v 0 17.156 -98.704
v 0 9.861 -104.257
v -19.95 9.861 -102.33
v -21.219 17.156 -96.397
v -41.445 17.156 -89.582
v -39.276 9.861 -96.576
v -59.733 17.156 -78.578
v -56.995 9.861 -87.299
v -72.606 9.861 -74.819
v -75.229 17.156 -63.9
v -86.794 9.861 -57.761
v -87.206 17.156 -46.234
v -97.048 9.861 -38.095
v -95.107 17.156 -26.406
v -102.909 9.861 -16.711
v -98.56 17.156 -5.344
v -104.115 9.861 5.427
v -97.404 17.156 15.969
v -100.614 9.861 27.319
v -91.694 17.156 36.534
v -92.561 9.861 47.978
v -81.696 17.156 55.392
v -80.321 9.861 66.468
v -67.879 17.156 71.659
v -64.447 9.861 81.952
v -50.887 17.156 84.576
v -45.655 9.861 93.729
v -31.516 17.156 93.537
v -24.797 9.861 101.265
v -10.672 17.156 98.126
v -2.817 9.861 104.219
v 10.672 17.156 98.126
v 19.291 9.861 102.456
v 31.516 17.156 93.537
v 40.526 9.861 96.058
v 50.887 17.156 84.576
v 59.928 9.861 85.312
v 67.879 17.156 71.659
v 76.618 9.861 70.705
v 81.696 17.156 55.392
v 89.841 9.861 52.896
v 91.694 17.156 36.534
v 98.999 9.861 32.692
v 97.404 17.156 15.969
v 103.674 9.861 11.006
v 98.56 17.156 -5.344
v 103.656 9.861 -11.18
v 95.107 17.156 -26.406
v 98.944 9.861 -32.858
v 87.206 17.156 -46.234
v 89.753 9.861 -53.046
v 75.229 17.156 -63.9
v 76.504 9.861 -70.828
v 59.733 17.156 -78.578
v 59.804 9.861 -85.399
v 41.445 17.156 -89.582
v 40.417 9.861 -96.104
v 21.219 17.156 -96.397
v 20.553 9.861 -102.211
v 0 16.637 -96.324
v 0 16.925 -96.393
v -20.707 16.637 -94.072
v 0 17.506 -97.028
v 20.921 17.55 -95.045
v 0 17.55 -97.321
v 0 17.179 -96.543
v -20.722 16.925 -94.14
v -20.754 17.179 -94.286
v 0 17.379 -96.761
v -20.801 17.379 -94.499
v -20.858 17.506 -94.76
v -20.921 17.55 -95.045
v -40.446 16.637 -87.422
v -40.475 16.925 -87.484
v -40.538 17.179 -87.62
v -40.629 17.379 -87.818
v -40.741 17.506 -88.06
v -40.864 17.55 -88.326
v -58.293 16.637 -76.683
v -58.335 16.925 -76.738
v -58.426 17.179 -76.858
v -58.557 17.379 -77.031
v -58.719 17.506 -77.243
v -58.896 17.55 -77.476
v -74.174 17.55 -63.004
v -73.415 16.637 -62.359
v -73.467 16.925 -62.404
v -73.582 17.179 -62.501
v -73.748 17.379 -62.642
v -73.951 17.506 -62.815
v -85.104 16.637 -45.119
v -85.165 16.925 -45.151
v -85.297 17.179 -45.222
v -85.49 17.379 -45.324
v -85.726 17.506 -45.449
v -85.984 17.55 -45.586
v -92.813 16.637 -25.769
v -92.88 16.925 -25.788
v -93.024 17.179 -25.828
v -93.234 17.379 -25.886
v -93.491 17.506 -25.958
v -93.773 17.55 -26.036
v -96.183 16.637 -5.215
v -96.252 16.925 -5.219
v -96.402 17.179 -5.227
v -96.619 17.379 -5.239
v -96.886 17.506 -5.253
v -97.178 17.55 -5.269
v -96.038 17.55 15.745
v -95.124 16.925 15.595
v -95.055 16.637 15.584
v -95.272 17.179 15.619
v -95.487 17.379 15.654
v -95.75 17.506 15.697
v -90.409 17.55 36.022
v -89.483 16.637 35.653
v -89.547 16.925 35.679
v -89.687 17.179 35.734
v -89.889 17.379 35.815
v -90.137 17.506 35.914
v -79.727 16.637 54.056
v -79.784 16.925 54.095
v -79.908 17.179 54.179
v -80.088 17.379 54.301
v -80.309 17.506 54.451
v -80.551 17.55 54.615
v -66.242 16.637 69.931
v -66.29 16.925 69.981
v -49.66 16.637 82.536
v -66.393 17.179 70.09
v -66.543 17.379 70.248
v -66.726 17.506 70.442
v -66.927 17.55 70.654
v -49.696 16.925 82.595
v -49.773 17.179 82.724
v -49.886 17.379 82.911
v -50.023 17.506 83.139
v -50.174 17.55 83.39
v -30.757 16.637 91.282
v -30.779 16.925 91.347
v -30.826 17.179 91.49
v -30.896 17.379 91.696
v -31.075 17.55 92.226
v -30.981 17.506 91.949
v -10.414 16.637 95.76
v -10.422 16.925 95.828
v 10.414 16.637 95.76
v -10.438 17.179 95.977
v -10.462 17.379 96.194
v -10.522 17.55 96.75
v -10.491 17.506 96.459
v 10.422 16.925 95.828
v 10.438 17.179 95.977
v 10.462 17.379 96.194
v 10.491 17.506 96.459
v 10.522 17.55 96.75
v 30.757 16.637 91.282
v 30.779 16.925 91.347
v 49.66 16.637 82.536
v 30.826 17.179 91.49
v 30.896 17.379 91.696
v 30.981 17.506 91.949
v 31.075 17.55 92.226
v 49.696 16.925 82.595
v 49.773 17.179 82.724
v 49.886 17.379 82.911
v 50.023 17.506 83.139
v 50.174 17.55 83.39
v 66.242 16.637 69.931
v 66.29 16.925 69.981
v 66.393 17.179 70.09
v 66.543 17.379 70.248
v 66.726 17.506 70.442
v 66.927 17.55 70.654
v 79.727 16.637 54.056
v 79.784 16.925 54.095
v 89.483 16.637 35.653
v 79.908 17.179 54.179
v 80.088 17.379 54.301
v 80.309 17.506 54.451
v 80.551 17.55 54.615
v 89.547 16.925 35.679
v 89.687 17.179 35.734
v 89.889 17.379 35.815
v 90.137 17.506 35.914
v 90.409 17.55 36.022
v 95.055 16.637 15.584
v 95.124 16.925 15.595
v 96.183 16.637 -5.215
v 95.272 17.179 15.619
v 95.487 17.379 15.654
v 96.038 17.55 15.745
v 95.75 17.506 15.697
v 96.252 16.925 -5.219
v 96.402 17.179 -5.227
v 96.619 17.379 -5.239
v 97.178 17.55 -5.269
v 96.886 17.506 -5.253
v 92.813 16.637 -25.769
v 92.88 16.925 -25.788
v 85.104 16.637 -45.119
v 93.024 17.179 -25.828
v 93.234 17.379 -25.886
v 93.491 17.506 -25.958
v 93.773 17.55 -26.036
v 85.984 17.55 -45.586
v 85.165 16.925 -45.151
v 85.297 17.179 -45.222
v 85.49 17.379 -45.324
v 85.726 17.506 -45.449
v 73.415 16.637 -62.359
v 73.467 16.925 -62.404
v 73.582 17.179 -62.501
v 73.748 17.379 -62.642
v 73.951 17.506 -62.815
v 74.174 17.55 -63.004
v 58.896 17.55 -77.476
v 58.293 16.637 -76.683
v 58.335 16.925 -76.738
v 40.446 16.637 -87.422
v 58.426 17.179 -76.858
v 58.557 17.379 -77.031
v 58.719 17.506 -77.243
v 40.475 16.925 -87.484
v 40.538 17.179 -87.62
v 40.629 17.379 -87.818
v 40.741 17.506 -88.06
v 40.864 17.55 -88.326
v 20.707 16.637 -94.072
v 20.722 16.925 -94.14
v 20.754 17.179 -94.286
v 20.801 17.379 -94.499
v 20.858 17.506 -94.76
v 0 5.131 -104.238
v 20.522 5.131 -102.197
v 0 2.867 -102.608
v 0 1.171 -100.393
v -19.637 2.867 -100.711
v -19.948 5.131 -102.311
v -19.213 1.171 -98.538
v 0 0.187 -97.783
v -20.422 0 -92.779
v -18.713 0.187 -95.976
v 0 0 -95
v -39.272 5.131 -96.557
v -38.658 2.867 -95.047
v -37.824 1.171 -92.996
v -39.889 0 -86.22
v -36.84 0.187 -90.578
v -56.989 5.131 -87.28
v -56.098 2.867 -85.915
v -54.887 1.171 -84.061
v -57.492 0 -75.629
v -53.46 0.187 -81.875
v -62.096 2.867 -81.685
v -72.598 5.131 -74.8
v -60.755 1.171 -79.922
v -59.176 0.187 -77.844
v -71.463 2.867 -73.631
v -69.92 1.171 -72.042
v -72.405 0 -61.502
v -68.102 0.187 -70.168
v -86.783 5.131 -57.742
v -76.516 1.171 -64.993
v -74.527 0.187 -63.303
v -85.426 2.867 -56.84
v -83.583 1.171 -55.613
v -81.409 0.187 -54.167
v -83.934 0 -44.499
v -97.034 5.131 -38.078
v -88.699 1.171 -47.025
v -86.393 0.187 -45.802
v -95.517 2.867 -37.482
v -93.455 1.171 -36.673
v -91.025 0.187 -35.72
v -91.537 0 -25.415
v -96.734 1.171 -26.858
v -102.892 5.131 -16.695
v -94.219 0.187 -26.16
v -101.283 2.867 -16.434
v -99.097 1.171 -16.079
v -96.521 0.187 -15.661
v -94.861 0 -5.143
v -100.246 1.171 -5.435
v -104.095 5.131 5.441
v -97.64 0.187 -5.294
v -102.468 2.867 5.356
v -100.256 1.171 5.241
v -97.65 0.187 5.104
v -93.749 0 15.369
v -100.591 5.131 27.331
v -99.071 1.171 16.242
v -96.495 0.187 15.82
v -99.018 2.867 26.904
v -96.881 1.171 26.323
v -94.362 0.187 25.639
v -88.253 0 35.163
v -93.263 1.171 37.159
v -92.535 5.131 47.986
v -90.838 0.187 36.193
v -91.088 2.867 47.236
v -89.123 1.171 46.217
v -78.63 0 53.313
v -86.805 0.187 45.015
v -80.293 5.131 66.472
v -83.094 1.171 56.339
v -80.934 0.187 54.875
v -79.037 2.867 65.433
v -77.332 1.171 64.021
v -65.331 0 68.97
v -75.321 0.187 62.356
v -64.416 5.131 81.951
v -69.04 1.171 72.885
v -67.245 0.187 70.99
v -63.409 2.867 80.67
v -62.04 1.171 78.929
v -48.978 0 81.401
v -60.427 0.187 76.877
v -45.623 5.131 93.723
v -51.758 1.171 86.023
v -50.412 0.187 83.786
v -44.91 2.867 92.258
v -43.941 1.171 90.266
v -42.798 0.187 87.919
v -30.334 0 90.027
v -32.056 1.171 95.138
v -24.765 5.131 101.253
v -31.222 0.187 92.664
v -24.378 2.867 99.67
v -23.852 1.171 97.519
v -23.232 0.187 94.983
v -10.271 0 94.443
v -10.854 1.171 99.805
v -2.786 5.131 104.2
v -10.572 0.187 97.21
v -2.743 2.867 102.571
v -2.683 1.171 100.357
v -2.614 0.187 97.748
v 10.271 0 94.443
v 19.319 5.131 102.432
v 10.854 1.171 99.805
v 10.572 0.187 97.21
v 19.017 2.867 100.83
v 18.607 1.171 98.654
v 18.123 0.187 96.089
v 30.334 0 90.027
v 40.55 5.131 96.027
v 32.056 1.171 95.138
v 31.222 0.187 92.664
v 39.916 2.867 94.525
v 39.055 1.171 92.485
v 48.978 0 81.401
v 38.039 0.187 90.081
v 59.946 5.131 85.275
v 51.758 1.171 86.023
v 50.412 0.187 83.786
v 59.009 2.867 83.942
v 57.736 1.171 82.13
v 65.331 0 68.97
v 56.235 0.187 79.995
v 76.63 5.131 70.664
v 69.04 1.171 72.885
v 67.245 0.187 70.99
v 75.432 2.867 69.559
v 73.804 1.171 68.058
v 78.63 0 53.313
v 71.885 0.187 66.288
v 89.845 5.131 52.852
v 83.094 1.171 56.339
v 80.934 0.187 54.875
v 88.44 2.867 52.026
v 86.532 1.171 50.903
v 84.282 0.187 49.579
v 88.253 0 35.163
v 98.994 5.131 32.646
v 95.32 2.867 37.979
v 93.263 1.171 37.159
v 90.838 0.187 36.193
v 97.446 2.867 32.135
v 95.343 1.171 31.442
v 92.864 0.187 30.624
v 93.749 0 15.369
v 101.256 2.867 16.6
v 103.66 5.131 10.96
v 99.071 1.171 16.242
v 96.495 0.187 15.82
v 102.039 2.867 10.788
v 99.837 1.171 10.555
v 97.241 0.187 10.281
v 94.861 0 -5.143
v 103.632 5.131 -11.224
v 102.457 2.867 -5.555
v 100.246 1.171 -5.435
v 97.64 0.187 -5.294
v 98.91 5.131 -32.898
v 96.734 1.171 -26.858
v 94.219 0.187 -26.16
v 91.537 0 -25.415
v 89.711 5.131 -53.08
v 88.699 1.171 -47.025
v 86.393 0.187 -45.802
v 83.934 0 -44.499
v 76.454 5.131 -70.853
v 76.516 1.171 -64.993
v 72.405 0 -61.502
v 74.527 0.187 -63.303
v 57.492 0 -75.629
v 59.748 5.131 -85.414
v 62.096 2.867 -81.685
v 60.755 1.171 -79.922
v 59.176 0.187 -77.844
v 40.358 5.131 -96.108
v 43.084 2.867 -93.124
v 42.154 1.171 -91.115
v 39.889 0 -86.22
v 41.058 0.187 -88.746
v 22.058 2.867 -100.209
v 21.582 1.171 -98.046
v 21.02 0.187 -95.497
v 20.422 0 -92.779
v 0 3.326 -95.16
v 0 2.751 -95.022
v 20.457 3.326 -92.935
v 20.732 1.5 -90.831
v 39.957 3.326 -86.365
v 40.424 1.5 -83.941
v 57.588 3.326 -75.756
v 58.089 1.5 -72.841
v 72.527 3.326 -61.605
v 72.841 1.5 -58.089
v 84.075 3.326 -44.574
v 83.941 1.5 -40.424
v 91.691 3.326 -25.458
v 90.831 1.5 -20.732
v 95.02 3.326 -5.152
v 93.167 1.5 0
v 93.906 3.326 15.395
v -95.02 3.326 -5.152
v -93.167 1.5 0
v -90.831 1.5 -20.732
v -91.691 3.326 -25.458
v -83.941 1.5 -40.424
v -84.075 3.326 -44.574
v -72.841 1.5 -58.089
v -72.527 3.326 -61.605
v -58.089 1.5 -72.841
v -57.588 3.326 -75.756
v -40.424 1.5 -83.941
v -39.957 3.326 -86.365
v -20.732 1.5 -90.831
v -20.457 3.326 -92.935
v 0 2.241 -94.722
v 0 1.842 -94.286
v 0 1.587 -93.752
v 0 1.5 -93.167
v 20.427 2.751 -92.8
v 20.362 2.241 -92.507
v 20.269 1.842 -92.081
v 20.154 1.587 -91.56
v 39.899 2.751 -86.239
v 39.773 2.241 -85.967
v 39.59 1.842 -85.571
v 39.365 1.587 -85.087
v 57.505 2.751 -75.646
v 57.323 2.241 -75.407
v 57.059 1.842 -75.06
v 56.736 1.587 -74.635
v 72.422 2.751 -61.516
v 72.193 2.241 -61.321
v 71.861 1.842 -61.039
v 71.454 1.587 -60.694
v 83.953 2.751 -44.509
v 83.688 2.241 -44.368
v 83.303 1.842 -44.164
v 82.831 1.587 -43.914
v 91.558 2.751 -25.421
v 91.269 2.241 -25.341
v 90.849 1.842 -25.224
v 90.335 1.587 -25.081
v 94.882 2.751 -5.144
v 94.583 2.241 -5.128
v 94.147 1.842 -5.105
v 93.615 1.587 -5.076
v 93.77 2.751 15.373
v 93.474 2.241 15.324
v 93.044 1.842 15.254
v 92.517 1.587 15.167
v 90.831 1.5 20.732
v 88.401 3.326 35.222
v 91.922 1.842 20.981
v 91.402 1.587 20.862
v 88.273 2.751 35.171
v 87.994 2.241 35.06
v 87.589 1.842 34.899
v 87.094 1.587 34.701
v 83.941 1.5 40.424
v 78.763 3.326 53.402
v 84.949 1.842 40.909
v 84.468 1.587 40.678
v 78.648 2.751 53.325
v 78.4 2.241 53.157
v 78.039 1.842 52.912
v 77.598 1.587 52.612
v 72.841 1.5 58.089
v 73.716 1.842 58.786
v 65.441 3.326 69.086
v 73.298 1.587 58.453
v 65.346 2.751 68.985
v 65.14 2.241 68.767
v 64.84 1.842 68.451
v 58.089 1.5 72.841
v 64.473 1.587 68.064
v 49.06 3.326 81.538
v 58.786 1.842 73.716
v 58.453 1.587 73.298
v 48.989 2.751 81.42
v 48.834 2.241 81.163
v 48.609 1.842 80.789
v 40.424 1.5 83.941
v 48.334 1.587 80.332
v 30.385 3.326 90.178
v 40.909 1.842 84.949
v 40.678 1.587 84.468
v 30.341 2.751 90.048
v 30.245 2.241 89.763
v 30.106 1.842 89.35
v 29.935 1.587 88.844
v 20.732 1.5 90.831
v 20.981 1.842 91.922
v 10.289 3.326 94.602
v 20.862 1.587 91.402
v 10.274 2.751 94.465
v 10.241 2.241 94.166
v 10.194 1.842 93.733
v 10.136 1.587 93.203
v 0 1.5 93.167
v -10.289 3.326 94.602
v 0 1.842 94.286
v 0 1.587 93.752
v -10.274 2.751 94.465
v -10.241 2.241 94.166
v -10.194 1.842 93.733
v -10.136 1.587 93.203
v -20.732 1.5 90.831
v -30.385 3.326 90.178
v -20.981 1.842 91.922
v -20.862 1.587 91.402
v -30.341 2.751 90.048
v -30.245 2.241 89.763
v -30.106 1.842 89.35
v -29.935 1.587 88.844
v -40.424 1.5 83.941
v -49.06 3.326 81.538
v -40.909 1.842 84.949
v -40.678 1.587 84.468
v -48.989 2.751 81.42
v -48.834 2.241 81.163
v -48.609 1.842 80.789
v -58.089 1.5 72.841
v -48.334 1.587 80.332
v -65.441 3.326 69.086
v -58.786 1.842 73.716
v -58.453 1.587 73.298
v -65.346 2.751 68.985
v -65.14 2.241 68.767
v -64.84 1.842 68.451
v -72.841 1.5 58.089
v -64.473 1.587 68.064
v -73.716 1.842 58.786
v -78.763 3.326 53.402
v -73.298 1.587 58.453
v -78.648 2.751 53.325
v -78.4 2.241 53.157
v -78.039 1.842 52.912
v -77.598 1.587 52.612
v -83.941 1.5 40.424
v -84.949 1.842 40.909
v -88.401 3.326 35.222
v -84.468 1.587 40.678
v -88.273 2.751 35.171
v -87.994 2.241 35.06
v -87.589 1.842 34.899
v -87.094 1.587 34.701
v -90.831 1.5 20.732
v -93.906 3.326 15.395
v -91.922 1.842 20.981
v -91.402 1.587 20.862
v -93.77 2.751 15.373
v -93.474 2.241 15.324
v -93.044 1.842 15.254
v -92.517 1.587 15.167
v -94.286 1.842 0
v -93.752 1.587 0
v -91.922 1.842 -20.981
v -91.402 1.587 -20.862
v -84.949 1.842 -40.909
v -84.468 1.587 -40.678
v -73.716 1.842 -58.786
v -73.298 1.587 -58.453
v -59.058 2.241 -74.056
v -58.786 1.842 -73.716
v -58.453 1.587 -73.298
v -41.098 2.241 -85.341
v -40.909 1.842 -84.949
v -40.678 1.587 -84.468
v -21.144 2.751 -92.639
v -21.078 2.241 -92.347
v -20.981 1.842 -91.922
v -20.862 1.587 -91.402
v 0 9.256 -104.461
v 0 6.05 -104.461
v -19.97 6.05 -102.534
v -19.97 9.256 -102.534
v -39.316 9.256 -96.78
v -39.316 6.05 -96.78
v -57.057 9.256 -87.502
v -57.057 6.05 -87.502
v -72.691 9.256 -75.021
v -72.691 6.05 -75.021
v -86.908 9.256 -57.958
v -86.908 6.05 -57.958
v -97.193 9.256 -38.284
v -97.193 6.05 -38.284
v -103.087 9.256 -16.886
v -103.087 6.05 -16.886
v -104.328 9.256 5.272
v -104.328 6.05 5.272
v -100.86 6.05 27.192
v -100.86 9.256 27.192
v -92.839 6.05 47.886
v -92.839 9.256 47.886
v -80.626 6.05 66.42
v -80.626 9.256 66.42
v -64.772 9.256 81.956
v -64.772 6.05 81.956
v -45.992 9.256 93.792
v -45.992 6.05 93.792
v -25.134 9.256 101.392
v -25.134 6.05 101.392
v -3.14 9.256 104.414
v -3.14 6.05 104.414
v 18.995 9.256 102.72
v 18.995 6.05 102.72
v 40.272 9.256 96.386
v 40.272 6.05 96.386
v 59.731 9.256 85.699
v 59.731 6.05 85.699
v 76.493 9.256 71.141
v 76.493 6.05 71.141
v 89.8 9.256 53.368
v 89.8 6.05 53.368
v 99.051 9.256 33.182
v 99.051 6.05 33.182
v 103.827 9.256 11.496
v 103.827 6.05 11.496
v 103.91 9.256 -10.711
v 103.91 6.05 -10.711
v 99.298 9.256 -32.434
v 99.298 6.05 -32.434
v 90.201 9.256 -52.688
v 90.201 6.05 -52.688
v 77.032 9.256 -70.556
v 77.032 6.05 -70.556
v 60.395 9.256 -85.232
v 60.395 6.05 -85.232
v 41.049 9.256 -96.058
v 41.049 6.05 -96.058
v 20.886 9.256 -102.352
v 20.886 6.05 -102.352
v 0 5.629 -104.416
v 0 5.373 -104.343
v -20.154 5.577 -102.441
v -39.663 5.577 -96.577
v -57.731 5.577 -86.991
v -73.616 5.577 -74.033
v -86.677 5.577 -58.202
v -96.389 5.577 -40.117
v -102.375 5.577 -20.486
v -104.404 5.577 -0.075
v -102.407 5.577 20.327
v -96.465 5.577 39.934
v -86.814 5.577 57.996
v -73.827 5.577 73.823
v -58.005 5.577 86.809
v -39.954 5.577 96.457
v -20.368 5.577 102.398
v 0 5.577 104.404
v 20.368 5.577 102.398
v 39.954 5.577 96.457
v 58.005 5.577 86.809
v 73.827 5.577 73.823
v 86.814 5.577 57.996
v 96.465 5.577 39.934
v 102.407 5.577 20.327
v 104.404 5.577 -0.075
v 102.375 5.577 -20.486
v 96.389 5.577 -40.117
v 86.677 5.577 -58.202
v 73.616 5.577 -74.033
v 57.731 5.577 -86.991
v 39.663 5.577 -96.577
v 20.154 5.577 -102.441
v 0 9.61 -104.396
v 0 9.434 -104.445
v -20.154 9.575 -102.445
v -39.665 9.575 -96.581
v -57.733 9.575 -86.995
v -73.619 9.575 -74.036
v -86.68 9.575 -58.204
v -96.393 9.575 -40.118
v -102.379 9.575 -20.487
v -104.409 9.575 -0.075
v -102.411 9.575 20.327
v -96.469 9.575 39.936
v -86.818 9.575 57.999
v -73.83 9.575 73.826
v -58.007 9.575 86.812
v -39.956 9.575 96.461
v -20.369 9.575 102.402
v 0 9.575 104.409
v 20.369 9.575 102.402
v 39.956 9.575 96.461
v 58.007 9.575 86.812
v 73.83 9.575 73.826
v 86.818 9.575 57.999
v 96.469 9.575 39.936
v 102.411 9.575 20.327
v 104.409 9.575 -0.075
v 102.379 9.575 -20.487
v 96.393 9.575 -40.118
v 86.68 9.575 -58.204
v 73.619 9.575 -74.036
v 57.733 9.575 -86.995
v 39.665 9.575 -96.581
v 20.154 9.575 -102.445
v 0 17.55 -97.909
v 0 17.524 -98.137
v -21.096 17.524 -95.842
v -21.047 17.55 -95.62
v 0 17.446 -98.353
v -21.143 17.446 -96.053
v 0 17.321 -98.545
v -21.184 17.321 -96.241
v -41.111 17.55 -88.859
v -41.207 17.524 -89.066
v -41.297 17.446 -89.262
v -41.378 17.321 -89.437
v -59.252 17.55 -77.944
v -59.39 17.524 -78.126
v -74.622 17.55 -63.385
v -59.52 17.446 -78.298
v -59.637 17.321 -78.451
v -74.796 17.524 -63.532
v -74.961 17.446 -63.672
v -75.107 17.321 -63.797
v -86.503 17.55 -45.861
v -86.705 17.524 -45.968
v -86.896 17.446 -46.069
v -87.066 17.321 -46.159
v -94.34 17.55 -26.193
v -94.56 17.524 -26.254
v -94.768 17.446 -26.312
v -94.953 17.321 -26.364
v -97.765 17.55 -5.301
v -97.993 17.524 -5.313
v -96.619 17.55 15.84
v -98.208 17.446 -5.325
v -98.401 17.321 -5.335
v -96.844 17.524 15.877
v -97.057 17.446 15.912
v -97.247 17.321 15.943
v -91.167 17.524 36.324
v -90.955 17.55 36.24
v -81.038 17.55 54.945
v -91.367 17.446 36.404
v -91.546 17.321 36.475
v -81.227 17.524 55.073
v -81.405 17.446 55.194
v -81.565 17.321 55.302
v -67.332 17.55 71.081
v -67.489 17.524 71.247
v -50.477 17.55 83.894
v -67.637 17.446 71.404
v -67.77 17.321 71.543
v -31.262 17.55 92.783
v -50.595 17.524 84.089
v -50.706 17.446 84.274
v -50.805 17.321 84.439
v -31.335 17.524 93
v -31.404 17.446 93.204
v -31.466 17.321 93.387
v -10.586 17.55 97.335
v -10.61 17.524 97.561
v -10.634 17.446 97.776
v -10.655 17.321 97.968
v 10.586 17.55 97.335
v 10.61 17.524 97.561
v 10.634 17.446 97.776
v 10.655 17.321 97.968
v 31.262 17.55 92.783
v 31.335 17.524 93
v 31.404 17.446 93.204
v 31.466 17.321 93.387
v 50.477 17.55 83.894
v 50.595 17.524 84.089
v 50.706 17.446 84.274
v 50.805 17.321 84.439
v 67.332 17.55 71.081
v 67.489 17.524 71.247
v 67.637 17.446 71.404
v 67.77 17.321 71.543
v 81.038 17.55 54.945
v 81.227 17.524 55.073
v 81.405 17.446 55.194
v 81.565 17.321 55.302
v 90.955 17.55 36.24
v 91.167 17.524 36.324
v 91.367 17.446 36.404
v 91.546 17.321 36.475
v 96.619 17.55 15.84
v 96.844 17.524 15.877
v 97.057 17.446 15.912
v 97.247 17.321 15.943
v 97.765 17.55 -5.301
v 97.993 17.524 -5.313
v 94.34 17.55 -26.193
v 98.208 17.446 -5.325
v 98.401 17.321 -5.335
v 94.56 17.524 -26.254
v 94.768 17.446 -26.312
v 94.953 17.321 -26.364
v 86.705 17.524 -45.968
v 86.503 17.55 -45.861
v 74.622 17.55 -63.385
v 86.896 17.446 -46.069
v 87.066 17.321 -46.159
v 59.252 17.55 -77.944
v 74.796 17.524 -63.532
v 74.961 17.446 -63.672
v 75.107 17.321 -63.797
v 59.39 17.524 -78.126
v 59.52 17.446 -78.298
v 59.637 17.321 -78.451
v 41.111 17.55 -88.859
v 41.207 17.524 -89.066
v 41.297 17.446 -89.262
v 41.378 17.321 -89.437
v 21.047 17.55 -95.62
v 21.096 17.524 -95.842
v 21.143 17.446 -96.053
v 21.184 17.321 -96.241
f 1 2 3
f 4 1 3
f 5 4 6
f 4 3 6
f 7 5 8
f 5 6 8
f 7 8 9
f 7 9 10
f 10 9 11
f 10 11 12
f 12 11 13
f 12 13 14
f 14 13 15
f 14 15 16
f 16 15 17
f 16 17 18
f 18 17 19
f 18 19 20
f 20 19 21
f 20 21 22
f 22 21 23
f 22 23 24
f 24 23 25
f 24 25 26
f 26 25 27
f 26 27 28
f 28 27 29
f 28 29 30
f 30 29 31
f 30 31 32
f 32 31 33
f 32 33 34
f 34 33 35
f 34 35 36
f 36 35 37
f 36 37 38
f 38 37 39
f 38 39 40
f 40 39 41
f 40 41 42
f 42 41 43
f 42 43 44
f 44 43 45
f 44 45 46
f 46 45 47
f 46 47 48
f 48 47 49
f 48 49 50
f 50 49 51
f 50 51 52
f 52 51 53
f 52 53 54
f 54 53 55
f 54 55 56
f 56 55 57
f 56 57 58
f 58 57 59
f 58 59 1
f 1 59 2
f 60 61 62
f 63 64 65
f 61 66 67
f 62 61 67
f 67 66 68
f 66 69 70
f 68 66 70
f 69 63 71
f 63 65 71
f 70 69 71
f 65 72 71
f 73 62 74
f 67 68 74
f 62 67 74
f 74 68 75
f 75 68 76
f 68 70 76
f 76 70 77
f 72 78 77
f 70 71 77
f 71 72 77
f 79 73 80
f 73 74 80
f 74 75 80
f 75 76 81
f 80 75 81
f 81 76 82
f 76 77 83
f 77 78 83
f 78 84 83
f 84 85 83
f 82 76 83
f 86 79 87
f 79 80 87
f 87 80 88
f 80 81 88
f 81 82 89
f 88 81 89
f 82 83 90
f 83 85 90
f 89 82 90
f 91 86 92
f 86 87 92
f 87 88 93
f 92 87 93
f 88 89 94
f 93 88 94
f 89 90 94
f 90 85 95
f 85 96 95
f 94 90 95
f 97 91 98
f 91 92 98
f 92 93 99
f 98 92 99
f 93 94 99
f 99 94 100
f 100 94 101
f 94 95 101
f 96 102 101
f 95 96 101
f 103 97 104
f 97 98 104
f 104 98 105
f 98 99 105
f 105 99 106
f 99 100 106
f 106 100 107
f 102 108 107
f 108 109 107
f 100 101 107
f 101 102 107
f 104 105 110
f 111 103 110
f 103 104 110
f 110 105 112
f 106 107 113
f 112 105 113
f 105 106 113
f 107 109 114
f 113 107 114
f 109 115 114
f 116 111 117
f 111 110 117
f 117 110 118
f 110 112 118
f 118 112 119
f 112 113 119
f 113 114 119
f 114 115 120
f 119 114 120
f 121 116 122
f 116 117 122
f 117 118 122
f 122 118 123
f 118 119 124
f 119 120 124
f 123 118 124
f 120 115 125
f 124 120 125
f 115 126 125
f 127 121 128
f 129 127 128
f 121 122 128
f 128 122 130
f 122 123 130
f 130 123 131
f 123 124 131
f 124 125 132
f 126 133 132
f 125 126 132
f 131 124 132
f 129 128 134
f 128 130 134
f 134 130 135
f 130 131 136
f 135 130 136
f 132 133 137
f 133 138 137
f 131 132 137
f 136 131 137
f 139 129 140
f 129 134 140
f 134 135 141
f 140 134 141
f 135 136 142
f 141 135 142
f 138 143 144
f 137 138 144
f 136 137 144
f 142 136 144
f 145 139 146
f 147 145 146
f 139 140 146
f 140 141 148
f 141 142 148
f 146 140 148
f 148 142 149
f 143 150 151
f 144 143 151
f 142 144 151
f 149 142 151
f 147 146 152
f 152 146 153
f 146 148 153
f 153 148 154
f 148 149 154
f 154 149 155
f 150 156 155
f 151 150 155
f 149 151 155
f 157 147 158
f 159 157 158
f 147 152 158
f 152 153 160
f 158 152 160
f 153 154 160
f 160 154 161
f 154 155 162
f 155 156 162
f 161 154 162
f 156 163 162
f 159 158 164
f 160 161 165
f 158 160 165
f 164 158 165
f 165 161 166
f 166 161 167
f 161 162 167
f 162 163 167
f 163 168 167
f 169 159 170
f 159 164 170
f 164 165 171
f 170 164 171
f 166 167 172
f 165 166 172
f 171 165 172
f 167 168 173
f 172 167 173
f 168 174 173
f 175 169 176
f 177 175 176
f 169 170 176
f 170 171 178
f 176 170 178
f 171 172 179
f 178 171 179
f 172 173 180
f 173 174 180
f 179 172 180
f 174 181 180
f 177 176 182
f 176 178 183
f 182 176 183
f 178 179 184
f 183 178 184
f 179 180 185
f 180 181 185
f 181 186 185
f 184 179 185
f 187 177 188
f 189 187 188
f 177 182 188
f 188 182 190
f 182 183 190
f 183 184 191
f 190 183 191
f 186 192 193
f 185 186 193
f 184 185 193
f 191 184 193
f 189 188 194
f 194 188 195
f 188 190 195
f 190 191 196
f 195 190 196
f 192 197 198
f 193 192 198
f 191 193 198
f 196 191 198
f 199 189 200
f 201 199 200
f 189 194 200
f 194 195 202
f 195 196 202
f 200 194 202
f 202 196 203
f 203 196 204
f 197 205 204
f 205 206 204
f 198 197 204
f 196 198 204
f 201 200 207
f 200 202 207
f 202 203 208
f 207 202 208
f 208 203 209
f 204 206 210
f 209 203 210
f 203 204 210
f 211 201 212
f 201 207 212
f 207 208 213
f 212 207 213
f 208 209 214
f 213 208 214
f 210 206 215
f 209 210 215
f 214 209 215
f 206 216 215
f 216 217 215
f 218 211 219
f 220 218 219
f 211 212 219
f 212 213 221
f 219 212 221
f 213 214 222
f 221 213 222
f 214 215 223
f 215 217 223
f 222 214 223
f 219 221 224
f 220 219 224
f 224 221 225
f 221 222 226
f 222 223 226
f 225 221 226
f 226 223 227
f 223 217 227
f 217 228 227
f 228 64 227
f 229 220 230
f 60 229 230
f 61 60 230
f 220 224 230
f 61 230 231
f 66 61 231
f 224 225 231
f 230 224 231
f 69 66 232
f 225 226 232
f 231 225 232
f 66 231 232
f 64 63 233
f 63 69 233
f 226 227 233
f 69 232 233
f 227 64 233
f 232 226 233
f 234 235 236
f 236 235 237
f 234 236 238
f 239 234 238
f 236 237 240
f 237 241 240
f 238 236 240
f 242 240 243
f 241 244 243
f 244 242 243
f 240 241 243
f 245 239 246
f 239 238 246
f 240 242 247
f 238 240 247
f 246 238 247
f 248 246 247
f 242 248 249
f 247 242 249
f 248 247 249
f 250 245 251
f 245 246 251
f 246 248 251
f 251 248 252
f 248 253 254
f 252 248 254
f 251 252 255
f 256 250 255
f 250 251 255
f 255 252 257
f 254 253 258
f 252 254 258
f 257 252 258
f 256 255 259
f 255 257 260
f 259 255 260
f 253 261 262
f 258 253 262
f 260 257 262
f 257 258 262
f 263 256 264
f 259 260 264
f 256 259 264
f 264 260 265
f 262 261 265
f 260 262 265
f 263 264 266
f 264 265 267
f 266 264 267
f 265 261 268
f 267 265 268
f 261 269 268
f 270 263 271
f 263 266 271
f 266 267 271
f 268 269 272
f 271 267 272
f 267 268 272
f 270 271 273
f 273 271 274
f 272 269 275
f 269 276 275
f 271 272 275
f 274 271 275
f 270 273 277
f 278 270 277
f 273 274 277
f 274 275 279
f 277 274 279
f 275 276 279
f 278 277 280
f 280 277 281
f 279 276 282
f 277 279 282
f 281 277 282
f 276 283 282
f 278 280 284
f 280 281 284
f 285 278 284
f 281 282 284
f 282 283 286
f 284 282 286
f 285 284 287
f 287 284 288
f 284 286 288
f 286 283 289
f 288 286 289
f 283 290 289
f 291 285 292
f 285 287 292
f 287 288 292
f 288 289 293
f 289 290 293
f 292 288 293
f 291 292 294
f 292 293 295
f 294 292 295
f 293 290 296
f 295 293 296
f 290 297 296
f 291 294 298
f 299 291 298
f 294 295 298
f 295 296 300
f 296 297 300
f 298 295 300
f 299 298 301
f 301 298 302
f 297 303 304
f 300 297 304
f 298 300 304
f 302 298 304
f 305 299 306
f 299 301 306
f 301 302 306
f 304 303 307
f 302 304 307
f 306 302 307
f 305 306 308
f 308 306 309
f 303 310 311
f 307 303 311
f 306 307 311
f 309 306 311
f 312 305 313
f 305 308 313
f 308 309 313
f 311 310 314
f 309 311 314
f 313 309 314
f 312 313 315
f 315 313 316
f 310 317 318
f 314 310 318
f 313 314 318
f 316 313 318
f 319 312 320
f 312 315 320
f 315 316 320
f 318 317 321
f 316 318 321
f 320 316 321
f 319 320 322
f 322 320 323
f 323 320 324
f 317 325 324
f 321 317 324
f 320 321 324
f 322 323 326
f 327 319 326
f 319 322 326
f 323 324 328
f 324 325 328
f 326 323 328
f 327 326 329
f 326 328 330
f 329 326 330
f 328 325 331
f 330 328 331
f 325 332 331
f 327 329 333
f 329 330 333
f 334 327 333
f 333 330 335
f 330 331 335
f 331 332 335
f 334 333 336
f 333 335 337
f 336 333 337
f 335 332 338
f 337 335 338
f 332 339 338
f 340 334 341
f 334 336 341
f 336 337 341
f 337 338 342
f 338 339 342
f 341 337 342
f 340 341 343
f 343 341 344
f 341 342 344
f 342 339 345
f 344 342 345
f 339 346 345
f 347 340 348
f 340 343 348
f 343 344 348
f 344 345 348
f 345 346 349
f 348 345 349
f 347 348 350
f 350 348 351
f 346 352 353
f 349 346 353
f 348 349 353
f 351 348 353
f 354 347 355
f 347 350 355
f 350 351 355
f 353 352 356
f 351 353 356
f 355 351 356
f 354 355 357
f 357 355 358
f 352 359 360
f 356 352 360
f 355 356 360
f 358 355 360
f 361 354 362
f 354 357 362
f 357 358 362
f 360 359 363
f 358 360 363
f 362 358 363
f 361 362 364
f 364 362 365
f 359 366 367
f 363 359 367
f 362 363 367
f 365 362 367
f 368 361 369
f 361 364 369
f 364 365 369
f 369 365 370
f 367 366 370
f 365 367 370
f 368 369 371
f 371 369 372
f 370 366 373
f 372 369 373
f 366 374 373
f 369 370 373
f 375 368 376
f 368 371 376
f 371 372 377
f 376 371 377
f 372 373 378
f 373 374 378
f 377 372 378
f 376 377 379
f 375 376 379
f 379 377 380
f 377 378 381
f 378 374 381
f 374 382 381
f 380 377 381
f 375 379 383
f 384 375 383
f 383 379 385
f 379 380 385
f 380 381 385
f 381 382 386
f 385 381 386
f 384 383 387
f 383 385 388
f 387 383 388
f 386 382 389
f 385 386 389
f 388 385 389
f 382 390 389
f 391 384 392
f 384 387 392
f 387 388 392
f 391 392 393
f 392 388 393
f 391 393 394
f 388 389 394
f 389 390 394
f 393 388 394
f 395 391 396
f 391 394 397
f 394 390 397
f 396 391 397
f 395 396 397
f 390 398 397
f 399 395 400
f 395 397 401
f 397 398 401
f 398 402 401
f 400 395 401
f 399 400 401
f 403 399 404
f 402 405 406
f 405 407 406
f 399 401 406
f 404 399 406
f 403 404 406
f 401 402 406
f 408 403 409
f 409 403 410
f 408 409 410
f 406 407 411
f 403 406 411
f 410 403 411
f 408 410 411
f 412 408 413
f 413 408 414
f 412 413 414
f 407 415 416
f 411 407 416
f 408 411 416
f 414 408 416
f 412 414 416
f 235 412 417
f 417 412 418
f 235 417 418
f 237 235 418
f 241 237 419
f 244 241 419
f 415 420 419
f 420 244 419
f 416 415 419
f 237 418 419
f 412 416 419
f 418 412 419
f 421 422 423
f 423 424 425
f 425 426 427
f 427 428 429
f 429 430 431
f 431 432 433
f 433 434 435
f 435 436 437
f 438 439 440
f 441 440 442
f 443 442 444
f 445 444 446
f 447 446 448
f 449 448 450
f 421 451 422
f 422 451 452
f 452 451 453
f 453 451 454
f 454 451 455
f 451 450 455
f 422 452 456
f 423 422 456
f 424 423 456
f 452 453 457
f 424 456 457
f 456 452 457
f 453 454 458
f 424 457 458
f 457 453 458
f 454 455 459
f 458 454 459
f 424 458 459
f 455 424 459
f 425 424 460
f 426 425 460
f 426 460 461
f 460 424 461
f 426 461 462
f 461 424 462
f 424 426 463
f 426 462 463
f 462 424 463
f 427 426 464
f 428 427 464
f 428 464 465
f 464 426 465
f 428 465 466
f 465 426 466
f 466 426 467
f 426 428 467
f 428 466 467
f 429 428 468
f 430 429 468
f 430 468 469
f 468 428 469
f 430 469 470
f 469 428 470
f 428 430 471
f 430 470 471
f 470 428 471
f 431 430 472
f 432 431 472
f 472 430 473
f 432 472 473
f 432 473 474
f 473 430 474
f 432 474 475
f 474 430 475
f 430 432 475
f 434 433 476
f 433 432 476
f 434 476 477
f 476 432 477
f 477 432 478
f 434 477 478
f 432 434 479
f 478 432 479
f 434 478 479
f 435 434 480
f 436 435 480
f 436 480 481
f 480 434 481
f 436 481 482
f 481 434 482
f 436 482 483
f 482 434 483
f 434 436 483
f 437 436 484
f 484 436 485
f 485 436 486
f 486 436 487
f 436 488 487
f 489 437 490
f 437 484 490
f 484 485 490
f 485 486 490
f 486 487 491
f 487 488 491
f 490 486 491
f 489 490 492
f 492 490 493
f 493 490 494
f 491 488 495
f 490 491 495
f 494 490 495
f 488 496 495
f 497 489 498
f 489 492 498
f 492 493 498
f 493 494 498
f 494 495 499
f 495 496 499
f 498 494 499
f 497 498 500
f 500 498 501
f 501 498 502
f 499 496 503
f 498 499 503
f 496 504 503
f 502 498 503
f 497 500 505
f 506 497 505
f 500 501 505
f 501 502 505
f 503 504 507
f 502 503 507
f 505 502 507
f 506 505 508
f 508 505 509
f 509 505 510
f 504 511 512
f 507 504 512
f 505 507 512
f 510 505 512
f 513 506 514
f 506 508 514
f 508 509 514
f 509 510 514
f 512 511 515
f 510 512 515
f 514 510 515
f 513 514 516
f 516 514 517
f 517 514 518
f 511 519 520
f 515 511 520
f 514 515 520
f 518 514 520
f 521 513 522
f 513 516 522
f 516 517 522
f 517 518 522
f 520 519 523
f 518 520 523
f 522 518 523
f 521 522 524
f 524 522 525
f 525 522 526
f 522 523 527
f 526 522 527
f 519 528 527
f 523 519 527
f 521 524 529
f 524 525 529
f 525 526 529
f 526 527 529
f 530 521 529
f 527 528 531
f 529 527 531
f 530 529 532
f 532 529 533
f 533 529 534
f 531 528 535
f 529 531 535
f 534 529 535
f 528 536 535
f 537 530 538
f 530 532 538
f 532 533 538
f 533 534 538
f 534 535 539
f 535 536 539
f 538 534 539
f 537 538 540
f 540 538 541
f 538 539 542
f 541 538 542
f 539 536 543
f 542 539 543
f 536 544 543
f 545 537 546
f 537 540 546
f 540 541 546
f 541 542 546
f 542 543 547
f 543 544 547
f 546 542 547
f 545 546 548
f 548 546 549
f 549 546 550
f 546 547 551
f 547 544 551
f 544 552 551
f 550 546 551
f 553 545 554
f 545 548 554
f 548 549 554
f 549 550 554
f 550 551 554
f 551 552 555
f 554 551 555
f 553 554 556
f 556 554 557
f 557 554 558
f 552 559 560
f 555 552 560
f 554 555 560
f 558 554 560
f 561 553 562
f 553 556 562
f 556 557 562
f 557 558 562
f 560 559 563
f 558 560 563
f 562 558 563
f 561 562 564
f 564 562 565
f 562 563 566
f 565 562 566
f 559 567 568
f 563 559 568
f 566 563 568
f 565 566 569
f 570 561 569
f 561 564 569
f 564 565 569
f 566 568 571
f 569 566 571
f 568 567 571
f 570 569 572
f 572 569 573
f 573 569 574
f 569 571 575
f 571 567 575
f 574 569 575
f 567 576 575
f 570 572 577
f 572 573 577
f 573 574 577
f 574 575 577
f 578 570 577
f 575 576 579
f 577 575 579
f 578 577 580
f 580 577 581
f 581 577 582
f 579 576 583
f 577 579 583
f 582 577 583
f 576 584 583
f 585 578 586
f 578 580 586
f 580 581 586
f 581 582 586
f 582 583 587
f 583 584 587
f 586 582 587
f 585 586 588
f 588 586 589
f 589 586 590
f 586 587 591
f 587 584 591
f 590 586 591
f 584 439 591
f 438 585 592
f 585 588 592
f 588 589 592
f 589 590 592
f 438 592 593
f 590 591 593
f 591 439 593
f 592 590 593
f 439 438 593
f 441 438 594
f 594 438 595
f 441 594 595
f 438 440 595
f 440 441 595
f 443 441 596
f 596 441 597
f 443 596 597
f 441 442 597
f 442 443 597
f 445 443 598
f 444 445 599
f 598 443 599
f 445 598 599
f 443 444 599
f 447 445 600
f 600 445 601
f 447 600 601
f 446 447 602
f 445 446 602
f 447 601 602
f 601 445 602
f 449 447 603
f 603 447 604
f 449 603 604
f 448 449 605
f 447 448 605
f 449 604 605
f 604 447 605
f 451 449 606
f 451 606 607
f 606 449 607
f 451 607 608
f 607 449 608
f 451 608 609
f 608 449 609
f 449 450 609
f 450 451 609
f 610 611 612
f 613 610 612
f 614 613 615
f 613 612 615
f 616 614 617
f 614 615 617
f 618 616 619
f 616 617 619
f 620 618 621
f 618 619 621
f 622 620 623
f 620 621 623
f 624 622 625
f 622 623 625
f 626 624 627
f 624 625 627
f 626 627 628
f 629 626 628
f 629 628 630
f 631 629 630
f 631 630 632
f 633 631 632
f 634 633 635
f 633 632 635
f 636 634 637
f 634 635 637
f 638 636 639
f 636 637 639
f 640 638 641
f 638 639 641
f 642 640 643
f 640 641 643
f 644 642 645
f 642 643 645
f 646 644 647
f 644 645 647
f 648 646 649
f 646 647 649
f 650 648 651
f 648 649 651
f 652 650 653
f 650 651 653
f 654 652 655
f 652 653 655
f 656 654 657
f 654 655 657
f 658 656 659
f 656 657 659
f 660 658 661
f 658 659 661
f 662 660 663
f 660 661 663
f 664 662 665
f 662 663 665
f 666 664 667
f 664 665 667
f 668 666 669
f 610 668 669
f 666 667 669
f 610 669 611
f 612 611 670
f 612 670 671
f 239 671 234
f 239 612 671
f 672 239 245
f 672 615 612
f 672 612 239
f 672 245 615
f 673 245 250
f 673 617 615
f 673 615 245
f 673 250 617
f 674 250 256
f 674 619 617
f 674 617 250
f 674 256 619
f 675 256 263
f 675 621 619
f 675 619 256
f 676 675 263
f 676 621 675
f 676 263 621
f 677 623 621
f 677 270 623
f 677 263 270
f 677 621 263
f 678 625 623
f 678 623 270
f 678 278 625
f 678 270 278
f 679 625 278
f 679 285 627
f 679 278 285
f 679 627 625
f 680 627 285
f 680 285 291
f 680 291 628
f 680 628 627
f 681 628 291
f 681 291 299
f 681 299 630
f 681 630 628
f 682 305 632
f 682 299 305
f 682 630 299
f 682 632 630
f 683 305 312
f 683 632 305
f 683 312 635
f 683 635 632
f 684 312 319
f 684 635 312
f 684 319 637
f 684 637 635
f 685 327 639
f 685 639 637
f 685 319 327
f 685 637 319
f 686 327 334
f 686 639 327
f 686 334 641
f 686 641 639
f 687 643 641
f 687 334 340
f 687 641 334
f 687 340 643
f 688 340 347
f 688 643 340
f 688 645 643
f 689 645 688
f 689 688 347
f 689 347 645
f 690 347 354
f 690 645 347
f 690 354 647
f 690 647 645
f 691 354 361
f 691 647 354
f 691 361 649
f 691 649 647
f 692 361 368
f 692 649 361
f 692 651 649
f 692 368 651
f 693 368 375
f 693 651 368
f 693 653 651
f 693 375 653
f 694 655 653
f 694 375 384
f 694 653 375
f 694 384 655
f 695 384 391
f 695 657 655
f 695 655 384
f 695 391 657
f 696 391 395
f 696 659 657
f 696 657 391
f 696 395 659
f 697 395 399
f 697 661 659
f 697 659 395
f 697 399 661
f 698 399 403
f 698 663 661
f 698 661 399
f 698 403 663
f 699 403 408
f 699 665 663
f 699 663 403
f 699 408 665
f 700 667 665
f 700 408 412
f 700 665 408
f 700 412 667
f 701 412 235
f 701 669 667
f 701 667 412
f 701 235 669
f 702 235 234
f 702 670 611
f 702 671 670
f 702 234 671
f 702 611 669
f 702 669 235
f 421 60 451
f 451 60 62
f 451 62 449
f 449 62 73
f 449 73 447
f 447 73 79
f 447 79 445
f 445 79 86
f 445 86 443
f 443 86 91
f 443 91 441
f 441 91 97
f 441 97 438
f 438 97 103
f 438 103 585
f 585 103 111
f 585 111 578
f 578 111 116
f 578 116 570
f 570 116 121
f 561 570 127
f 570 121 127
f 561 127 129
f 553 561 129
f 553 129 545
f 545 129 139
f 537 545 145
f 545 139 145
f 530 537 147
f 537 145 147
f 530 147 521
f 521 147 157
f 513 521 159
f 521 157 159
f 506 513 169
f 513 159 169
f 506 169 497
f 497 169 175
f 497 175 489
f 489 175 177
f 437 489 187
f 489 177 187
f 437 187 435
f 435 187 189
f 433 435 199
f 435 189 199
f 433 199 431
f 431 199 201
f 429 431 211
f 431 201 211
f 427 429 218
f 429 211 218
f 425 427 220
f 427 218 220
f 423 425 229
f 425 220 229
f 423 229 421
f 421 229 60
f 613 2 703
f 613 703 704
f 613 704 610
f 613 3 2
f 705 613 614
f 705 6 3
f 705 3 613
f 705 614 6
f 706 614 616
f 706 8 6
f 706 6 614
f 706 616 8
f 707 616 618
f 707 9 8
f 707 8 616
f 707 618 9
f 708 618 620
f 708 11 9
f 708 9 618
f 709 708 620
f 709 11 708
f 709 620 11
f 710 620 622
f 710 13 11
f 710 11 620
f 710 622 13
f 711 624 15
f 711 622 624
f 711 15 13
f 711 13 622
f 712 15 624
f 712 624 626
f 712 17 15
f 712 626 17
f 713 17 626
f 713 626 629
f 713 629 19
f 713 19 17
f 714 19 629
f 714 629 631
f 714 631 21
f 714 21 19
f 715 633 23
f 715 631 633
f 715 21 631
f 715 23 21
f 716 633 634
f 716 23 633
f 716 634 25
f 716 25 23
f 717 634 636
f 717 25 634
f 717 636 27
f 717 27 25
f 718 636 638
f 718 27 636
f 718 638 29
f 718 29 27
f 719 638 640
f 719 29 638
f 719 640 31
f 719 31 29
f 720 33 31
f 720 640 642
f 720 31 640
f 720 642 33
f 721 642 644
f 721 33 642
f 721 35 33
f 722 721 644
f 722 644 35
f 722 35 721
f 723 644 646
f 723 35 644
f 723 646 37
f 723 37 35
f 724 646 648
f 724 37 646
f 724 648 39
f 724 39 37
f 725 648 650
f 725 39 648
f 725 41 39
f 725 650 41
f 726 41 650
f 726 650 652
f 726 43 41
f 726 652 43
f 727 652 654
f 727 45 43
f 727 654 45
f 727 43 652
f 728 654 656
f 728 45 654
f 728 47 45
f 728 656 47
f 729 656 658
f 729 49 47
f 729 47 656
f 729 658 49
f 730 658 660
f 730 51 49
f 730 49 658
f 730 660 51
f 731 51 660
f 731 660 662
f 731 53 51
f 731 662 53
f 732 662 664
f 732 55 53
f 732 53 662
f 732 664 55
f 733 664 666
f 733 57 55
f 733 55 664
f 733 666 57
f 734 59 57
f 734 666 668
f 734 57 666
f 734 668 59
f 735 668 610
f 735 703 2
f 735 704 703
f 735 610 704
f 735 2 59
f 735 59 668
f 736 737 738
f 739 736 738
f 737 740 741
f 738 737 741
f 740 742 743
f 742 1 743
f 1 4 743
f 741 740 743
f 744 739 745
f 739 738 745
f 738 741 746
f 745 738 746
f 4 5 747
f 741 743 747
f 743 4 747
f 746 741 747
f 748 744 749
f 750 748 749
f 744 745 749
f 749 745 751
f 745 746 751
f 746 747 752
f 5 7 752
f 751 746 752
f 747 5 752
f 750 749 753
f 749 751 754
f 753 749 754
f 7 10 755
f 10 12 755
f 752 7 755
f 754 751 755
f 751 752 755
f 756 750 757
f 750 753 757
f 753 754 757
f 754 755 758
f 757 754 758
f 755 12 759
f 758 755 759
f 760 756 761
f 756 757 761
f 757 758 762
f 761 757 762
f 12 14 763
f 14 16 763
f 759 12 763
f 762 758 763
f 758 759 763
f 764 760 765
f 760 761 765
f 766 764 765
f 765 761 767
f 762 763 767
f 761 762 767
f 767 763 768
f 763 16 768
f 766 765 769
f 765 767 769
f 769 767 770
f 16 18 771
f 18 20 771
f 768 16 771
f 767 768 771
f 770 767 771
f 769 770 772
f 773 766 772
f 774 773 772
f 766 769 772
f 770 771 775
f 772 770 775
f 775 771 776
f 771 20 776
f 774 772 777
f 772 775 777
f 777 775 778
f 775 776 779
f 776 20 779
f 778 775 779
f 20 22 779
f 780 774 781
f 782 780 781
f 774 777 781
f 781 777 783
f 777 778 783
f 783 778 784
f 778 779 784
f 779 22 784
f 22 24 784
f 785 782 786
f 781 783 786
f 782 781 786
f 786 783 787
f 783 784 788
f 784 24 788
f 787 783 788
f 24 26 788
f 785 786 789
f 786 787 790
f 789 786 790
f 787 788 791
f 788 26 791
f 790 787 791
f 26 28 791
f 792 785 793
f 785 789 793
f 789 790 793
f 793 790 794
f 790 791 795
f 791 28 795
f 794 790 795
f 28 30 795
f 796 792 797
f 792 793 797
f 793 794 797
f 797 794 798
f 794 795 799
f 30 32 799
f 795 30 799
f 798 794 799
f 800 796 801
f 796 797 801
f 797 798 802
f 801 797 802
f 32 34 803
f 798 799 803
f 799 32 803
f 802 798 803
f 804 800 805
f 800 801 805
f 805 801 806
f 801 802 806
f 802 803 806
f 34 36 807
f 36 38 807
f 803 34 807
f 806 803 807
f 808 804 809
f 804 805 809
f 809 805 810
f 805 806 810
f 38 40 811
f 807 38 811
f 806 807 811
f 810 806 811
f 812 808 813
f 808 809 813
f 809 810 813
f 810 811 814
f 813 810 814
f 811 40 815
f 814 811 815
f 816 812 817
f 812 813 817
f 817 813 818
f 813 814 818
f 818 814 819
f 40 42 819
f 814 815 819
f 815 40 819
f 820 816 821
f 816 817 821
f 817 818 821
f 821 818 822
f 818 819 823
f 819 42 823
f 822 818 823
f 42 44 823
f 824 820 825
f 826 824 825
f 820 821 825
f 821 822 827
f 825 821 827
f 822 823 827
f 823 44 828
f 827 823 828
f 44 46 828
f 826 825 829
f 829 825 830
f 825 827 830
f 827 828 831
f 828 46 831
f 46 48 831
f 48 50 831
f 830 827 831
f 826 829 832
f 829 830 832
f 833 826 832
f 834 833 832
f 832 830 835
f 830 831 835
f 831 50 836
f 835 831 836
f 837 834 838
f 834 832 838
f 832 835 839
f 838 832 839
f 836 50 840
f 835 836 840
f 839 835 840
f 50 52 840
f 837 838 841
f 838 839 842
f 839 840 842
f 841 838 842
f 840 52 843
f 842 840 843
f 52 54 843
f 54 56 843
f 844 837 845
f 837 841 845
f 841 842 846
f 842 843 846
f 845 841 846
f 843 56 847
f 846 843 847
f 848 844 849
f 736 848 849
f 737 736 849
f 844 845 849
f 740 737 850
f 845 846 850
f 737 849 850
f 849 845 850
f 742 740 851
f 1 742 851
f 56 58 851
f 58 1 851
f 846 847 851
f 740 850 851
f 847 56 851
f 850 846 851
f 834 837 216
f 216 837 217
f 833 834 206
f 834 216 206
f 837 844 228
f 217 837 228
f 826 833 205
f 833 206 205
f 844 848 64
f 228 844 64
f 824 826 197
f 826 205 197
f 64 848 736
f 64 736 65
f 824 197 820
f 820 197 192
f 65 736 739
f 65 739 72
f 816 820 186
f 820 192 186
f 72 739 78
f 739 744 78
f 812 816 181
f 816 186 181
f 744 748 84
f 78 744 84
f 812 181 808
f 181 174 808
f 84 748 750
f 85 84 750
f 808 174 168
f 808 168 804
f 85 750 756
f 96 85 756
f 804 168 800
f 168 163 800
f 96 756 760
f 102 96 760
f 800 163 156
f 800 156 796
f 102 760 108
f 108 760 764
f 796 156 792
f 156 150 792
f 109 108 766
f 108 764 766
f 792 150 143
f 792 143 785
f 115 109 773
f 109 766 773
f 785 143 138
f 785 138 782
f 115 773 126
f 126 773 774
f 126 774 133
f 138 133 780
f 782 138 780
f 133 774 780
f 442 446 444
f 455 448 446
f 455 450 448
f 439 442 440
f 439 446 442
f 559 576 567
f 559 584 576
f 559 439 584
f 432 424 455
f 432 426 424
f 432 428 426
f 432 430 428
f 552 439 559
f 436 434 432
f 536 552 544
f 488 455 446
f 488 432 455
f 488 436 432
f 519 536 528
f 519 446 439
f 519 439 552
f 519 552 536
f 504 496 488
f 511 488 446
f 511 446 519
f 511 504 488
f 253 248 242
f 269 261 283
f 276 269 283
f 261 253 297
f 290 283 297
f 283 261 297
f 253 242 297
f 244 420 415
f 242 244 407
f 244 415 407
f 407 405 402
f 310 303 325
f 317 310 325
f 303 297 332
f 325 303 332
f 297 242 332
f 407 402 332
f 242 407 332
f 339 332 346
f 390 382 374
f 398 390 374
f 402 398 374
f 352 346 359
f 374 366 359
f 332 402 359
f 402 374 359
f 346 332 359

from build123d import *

# Parameters (mm, degrees)
SKETCH1_R           = 95
BOSS_EXTRUDE1_DEPTH = 1.5
FILLET1_R           = 1
FILLET2_R           = 1
FILLET4_R           = 2
FILLET5_R           = 2


with BuildPart() as part:
    # Sketch1 → Boss-Extrude1 (new body)
    with BuildSketch(Plane(origin=(0, 0, 0), x_dir=(1, 0, 0), z_dir=(0, 1, 0))):
        with Locations(Location((0, 0, 0), (0, 0, 270))):
            Circle(SKETCH1_R)
    extrude(amount=BOSS_EXTRUDE1_DEPTH)

    # Sketch2 → Revolve1 (revolve)
    with BuildSketch(Plane.XY, mode=Mode.PRIVATE) as revolve1_sk:
        with BuildLine():
            Line((95, 1.5), (96.40419305, 17.55))
            Line((96.40419305, 17.55), (98.40419305, 17.55))
            Line((98.40419305, 17.55), (104.461103858, 9.593001102))
            Line((104.461103858, 9.593001102), (104.461103858, 5.593001102))
            ThreePointArc((104.461103858, 5.593001102), (100.616111366, 1.298490869), (95, 0))
            Line((95, 0), (95, 1.5))
        make_face()
    revolve(revolve1_sk.sketch.rotate(Axis((0, 0, 0), (0, 1, 0)), 90), axis=Axis((0, 0, 0), (0, 1, 0)))

    # Fillet1
    fillet1_edges = [part.edges().sort_by_distance(p)[0] for p in [
        (0, 17.55, 98.40419305),
        (0, 17.55, 96.40419305),
    ]]
    fillet(fillet1_edges, radius=FILLET1_R)

    # Fillet2
    fillet2_edges = [part.edges().sort_by_distance(p)[0] for p in [
        (0, 9.593001102, 104.461103858),
    ]]
    fillet(fillet2_edges, radius=FILLET2_R)

    # Fillet4
    fillet4_edges = [part.edges().sort_by_distance(p)[0] for p in [
        (0, 5.593001102, 104.461103858),
    ]]
    fillet(fillet4_edges, radius=FILLET4_R)

    # Fillet5
    fillet5_edges = [part.edges().sort_by_distance(p)[0] for p in [
        (0, 1.5, 95),
    ]]
    fillet(fillet5_edges, radius=FILLET5_R)


solid = part.part
